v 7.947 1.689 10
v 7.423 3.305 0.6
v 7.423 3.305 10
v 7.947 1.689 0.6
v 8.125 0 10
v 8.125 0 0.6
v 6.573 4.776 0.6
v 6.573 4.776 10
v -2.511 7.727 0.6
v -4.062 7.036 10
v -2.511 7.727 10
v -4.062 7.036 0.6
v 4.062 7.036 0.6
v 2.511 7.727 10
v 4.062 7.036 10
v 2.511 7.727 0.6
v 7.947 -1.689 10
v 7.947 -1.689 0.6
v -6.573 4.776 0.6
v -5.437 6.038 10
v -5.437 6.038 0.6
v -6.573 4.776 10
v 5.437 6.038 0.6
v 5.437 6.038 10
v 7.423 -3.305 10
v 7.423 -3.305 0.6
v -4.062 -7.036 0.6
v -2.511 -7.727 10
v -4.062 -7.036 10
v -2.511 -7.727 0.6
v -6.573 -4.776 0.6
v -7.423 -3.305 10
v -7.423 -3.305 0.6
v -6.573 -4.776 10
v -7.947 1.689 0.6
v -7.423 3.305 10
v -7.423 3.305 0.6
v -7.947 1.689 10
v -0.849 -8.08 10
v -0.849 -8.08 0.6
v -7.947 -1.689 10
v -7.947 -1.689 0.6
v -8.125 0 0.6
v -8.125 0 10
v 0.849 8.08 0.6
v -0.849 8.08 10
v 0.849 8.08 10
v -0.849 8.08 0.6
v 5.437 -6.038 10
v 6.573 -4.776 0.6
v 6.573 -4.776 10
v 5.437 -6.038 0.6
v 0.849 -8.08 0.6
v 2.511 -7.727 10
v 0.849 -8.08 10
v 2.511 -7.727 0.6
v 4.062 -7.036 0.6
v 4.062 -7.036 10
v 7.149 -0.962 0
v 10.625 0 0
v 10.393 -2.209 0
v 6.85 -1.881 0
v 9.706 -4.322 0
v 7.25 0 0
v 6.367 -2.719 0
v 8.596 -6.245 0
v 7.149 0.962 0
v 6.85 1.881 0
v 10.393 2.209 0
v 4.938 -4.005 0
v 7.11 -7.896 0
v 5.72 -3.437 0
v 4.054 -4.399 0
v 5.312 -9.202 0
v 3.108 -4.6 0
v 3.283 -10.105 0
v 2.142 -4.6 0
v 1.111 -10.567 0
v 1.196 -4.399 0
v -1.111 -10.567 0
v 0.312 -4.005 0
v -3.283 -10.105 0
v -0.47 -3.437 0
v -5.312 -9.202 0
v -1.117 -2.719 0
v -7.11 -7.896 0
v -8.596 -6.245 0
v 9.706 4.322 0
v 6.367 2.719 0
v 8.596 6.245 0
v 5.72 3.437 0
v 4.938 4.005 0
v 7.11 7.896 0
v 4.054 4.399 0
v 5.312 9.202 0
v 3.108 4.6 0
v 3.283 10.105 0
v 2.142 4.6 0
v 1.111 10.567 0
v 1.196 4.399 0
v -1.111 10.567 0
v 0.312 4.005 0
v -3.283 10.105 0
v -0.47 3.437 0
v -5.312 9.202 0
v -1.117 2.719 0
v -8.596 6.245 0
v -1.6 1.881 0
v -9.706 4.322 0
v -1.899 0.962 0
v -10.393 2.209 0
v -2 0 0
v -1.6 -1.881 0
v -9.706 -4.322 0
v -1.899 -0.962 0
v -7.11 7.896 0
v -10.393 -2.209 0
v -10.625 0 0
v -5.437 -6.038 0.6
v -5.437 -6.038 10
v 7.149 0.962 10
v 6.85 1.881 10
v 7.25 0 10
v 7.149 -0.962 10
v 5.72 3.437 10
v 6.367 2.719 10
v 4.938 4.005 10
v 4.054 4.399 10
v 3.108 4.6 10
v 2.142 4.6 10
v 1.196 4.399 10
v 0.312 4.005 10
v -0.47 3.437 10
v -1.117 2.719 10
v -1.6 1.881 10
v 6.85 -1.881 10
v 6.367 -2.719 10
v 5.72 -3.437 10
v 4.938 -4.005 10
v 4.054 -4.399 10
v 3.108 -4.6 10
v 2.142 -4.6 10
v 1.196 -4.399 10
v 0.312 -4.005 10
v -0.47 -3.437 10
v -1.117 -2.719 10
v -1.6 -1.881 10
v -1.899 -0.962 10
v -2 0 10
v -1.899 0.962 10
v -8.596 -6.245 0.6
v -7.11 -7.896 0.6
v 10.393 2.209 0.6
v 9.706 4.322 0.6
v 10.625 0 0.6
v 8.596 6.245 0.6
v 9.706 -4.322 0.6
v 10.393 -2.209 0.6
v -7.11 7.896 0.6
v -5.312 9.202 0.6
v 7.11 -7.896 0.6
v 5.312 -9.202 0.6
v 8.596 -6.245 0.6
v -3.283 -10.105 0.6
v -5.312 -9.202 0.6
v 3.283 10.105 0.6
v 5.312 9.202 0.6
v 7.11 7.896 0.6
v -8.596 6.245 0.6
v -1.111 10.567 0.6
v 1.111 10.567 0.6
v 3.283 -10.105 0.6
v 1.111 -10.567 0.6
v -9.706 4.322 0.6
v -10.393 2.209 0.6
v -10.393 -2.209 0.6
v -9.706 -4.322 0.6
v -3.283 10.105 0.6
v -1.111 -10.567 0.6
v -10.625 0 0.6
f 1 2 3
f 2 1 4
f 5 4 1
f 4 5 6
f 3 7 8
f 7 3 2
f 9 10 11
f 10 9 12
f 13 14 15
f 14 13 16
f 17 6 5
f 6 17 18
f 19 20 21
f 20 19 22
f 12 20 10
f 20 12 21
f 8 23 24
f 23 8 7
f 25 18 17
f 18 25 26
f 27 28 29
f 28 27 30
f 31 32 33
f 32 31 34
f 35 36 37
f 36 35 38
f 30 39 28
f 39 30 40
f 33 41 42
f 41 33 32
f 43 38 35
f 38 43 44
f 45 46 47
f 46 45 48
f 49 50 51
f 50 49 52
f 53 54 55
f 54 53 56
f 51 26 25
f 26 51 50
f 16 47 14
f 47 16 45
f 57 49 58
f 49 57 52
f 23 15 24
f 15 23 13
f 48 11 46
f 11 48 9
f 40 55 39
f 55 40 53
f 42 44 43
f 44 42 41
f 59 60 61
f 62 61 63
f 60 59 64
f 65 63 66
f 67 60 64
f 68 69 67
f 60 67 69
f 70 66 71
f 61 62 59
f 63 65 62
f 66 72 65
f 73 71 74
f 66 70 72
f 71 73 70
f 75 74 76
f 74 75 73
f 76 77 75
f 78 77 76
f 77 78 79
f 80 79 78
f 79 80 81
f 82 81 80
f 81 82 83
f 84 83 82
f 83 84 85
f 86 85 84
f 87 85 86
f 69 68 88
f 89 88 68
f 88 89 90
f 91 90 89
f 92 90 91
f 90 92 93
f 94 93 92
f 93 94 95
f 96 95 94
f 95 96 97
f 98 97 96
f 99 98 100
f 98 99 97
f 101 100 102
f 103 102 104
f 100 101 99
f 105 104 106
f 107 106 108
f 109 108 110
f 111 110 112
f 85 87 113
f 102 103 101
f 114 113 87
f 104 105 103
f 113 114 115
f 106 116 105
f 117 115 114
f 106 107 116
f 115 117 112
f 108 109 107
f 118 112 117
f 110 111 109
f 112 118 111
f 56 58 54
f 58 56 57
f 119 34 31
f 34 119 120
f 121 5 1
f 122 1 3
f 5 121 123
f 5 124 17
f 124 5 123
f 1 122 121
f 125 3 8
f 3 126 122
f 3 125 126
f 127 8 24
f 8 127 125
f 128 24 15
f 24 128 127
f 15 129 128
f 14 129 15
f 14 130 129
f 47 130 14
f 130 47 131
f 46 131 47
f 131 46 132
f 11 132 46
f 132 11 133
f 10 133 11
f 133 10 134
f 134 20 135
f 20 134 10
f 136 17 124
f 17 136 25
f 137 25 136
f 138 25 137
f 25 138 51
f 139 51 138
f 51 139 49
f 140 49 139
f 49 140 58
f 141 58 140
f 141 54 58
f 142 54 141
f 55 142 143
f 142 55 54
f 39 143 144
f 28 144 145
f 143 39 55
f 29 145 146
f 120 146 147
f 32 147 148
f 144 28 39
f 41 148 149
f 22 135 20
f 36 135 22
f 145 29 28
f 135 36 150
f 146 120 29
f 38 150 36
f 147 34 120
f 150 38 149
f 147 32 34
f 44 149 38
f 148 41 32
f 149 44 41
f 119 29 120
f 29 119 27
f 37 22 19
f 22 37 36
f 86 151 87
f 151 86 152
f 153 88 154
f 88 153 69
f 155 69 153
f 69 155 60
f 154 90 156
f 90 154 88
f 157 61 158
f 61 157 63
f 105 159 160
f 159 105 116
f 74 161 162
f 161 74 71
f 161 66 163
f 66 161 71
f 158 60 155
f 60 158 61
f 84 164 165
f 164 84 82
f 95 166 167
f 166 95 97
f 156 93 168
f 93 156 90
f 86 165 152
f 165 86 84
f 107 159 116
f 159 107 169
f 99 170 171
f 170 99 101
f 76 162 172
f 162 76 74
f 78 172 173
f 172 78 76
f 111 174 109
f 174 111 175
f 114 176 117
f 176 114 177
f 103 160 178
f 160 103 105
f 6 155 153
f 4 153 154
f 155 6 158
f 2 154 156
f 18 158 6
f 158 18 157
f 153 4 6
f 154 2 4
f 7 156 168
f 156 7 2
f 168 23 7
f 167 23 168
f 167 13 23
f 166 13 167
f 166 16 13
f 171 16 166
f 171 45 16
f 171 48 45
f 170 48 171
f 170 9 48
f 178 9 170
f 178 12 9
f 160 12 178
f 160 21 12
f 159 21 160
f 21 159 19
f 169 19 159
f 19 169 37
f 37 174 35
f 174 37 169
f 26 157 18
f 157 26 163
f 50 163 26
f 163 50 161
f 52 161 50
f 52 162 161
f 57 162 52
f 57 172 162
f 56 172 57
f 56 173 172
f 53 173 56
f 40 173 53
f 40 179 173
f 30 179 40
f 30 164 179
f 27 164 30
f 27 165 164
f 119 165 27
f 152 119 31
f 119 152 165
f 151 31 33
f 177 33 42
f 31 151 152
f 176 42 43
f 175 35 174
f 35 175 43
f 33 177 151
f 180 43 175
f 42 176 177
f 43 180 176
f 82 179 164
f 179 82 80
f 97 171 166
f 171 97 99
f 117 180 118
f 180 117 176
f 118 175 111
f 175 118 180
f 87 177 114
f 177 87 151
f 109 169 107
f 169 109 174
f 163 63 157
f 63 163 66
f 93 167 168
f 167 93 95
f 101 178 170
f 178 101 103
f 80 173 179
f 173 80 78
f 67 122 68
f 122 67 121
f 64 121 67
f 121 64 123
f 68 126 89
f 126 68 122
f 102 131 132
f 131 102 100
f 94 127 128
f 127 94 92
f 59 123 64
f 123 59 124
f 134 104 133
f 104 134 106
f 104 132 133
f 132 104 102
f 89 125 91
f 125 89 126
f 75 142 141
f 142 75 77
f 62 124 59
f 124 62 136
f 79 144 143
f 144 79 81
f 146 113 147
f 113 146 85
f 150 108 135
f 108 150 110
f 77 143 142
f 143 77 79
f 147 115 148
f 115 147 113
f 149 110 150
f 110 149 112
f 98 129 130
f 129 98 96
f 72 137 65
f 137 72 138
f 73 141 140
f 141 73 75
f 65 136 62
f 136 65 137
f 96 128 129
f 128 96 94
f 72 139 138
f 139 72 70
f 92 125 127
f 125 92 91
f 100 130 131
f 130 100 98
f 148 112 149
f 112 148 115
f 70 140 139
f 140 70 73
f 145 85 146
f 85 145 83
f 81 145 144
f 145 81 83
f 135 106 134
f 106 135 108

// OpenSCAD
/*
Toilet seat wobble fixer
This bushing shims the bolt to the toilet so the seat won't wiggle so bad

Mike Creuzer - Mike@Creuzer.com - 2012-08-23
Update 2012-12-23 Added offset to allow for elliptical usage for seats that don't exactly align to the center of the stool's holes.
Update 2013-01-14 Tweaked parameter names for customizer

Measurements are dimensionless but assumed to be in mm for most programs.
*/

//Toilet measurement - maybe make this a bit short if your nut is convex
hole_depth = 10;
//Toilet measurement
hole_width = 16.25;

// Bolt measurement
bolt_width = 9.25;

// Part Measurement - Make this a couple of layers for your printer for good results.
brim_height = 0.6; 
// Part Measurement - Shoulder so the shim won't fall out of the hole.
brim_width = 5;
//Percentage to offset the center hole from center.
hole_offset = 75; //  [0:100]
offset = hole_offset * 0.01;
// (factor * by .02) 2 is the default for fast rendering, .01 is as good as it gets. 
curve_quality_percentage = 0.5; // [.5:100]
curve_quality = curve_quality_percentage * .02;

difference()
{
	union()
	{
		cylinder(r = hole_width / 2, h=hole_depth, $fs = curve_quality); // The shim
		cylinder(r = (hole_width + brim_width) / 2, h=brim_height); // the shoulder
	}
	translate(v = [offset * ((hole_width-bolt_width) / 2), 0, 0]) cylinder(r = bolt_width / 2, h=hole_depth, $fs = curve_quality); // The bolt hole
}
